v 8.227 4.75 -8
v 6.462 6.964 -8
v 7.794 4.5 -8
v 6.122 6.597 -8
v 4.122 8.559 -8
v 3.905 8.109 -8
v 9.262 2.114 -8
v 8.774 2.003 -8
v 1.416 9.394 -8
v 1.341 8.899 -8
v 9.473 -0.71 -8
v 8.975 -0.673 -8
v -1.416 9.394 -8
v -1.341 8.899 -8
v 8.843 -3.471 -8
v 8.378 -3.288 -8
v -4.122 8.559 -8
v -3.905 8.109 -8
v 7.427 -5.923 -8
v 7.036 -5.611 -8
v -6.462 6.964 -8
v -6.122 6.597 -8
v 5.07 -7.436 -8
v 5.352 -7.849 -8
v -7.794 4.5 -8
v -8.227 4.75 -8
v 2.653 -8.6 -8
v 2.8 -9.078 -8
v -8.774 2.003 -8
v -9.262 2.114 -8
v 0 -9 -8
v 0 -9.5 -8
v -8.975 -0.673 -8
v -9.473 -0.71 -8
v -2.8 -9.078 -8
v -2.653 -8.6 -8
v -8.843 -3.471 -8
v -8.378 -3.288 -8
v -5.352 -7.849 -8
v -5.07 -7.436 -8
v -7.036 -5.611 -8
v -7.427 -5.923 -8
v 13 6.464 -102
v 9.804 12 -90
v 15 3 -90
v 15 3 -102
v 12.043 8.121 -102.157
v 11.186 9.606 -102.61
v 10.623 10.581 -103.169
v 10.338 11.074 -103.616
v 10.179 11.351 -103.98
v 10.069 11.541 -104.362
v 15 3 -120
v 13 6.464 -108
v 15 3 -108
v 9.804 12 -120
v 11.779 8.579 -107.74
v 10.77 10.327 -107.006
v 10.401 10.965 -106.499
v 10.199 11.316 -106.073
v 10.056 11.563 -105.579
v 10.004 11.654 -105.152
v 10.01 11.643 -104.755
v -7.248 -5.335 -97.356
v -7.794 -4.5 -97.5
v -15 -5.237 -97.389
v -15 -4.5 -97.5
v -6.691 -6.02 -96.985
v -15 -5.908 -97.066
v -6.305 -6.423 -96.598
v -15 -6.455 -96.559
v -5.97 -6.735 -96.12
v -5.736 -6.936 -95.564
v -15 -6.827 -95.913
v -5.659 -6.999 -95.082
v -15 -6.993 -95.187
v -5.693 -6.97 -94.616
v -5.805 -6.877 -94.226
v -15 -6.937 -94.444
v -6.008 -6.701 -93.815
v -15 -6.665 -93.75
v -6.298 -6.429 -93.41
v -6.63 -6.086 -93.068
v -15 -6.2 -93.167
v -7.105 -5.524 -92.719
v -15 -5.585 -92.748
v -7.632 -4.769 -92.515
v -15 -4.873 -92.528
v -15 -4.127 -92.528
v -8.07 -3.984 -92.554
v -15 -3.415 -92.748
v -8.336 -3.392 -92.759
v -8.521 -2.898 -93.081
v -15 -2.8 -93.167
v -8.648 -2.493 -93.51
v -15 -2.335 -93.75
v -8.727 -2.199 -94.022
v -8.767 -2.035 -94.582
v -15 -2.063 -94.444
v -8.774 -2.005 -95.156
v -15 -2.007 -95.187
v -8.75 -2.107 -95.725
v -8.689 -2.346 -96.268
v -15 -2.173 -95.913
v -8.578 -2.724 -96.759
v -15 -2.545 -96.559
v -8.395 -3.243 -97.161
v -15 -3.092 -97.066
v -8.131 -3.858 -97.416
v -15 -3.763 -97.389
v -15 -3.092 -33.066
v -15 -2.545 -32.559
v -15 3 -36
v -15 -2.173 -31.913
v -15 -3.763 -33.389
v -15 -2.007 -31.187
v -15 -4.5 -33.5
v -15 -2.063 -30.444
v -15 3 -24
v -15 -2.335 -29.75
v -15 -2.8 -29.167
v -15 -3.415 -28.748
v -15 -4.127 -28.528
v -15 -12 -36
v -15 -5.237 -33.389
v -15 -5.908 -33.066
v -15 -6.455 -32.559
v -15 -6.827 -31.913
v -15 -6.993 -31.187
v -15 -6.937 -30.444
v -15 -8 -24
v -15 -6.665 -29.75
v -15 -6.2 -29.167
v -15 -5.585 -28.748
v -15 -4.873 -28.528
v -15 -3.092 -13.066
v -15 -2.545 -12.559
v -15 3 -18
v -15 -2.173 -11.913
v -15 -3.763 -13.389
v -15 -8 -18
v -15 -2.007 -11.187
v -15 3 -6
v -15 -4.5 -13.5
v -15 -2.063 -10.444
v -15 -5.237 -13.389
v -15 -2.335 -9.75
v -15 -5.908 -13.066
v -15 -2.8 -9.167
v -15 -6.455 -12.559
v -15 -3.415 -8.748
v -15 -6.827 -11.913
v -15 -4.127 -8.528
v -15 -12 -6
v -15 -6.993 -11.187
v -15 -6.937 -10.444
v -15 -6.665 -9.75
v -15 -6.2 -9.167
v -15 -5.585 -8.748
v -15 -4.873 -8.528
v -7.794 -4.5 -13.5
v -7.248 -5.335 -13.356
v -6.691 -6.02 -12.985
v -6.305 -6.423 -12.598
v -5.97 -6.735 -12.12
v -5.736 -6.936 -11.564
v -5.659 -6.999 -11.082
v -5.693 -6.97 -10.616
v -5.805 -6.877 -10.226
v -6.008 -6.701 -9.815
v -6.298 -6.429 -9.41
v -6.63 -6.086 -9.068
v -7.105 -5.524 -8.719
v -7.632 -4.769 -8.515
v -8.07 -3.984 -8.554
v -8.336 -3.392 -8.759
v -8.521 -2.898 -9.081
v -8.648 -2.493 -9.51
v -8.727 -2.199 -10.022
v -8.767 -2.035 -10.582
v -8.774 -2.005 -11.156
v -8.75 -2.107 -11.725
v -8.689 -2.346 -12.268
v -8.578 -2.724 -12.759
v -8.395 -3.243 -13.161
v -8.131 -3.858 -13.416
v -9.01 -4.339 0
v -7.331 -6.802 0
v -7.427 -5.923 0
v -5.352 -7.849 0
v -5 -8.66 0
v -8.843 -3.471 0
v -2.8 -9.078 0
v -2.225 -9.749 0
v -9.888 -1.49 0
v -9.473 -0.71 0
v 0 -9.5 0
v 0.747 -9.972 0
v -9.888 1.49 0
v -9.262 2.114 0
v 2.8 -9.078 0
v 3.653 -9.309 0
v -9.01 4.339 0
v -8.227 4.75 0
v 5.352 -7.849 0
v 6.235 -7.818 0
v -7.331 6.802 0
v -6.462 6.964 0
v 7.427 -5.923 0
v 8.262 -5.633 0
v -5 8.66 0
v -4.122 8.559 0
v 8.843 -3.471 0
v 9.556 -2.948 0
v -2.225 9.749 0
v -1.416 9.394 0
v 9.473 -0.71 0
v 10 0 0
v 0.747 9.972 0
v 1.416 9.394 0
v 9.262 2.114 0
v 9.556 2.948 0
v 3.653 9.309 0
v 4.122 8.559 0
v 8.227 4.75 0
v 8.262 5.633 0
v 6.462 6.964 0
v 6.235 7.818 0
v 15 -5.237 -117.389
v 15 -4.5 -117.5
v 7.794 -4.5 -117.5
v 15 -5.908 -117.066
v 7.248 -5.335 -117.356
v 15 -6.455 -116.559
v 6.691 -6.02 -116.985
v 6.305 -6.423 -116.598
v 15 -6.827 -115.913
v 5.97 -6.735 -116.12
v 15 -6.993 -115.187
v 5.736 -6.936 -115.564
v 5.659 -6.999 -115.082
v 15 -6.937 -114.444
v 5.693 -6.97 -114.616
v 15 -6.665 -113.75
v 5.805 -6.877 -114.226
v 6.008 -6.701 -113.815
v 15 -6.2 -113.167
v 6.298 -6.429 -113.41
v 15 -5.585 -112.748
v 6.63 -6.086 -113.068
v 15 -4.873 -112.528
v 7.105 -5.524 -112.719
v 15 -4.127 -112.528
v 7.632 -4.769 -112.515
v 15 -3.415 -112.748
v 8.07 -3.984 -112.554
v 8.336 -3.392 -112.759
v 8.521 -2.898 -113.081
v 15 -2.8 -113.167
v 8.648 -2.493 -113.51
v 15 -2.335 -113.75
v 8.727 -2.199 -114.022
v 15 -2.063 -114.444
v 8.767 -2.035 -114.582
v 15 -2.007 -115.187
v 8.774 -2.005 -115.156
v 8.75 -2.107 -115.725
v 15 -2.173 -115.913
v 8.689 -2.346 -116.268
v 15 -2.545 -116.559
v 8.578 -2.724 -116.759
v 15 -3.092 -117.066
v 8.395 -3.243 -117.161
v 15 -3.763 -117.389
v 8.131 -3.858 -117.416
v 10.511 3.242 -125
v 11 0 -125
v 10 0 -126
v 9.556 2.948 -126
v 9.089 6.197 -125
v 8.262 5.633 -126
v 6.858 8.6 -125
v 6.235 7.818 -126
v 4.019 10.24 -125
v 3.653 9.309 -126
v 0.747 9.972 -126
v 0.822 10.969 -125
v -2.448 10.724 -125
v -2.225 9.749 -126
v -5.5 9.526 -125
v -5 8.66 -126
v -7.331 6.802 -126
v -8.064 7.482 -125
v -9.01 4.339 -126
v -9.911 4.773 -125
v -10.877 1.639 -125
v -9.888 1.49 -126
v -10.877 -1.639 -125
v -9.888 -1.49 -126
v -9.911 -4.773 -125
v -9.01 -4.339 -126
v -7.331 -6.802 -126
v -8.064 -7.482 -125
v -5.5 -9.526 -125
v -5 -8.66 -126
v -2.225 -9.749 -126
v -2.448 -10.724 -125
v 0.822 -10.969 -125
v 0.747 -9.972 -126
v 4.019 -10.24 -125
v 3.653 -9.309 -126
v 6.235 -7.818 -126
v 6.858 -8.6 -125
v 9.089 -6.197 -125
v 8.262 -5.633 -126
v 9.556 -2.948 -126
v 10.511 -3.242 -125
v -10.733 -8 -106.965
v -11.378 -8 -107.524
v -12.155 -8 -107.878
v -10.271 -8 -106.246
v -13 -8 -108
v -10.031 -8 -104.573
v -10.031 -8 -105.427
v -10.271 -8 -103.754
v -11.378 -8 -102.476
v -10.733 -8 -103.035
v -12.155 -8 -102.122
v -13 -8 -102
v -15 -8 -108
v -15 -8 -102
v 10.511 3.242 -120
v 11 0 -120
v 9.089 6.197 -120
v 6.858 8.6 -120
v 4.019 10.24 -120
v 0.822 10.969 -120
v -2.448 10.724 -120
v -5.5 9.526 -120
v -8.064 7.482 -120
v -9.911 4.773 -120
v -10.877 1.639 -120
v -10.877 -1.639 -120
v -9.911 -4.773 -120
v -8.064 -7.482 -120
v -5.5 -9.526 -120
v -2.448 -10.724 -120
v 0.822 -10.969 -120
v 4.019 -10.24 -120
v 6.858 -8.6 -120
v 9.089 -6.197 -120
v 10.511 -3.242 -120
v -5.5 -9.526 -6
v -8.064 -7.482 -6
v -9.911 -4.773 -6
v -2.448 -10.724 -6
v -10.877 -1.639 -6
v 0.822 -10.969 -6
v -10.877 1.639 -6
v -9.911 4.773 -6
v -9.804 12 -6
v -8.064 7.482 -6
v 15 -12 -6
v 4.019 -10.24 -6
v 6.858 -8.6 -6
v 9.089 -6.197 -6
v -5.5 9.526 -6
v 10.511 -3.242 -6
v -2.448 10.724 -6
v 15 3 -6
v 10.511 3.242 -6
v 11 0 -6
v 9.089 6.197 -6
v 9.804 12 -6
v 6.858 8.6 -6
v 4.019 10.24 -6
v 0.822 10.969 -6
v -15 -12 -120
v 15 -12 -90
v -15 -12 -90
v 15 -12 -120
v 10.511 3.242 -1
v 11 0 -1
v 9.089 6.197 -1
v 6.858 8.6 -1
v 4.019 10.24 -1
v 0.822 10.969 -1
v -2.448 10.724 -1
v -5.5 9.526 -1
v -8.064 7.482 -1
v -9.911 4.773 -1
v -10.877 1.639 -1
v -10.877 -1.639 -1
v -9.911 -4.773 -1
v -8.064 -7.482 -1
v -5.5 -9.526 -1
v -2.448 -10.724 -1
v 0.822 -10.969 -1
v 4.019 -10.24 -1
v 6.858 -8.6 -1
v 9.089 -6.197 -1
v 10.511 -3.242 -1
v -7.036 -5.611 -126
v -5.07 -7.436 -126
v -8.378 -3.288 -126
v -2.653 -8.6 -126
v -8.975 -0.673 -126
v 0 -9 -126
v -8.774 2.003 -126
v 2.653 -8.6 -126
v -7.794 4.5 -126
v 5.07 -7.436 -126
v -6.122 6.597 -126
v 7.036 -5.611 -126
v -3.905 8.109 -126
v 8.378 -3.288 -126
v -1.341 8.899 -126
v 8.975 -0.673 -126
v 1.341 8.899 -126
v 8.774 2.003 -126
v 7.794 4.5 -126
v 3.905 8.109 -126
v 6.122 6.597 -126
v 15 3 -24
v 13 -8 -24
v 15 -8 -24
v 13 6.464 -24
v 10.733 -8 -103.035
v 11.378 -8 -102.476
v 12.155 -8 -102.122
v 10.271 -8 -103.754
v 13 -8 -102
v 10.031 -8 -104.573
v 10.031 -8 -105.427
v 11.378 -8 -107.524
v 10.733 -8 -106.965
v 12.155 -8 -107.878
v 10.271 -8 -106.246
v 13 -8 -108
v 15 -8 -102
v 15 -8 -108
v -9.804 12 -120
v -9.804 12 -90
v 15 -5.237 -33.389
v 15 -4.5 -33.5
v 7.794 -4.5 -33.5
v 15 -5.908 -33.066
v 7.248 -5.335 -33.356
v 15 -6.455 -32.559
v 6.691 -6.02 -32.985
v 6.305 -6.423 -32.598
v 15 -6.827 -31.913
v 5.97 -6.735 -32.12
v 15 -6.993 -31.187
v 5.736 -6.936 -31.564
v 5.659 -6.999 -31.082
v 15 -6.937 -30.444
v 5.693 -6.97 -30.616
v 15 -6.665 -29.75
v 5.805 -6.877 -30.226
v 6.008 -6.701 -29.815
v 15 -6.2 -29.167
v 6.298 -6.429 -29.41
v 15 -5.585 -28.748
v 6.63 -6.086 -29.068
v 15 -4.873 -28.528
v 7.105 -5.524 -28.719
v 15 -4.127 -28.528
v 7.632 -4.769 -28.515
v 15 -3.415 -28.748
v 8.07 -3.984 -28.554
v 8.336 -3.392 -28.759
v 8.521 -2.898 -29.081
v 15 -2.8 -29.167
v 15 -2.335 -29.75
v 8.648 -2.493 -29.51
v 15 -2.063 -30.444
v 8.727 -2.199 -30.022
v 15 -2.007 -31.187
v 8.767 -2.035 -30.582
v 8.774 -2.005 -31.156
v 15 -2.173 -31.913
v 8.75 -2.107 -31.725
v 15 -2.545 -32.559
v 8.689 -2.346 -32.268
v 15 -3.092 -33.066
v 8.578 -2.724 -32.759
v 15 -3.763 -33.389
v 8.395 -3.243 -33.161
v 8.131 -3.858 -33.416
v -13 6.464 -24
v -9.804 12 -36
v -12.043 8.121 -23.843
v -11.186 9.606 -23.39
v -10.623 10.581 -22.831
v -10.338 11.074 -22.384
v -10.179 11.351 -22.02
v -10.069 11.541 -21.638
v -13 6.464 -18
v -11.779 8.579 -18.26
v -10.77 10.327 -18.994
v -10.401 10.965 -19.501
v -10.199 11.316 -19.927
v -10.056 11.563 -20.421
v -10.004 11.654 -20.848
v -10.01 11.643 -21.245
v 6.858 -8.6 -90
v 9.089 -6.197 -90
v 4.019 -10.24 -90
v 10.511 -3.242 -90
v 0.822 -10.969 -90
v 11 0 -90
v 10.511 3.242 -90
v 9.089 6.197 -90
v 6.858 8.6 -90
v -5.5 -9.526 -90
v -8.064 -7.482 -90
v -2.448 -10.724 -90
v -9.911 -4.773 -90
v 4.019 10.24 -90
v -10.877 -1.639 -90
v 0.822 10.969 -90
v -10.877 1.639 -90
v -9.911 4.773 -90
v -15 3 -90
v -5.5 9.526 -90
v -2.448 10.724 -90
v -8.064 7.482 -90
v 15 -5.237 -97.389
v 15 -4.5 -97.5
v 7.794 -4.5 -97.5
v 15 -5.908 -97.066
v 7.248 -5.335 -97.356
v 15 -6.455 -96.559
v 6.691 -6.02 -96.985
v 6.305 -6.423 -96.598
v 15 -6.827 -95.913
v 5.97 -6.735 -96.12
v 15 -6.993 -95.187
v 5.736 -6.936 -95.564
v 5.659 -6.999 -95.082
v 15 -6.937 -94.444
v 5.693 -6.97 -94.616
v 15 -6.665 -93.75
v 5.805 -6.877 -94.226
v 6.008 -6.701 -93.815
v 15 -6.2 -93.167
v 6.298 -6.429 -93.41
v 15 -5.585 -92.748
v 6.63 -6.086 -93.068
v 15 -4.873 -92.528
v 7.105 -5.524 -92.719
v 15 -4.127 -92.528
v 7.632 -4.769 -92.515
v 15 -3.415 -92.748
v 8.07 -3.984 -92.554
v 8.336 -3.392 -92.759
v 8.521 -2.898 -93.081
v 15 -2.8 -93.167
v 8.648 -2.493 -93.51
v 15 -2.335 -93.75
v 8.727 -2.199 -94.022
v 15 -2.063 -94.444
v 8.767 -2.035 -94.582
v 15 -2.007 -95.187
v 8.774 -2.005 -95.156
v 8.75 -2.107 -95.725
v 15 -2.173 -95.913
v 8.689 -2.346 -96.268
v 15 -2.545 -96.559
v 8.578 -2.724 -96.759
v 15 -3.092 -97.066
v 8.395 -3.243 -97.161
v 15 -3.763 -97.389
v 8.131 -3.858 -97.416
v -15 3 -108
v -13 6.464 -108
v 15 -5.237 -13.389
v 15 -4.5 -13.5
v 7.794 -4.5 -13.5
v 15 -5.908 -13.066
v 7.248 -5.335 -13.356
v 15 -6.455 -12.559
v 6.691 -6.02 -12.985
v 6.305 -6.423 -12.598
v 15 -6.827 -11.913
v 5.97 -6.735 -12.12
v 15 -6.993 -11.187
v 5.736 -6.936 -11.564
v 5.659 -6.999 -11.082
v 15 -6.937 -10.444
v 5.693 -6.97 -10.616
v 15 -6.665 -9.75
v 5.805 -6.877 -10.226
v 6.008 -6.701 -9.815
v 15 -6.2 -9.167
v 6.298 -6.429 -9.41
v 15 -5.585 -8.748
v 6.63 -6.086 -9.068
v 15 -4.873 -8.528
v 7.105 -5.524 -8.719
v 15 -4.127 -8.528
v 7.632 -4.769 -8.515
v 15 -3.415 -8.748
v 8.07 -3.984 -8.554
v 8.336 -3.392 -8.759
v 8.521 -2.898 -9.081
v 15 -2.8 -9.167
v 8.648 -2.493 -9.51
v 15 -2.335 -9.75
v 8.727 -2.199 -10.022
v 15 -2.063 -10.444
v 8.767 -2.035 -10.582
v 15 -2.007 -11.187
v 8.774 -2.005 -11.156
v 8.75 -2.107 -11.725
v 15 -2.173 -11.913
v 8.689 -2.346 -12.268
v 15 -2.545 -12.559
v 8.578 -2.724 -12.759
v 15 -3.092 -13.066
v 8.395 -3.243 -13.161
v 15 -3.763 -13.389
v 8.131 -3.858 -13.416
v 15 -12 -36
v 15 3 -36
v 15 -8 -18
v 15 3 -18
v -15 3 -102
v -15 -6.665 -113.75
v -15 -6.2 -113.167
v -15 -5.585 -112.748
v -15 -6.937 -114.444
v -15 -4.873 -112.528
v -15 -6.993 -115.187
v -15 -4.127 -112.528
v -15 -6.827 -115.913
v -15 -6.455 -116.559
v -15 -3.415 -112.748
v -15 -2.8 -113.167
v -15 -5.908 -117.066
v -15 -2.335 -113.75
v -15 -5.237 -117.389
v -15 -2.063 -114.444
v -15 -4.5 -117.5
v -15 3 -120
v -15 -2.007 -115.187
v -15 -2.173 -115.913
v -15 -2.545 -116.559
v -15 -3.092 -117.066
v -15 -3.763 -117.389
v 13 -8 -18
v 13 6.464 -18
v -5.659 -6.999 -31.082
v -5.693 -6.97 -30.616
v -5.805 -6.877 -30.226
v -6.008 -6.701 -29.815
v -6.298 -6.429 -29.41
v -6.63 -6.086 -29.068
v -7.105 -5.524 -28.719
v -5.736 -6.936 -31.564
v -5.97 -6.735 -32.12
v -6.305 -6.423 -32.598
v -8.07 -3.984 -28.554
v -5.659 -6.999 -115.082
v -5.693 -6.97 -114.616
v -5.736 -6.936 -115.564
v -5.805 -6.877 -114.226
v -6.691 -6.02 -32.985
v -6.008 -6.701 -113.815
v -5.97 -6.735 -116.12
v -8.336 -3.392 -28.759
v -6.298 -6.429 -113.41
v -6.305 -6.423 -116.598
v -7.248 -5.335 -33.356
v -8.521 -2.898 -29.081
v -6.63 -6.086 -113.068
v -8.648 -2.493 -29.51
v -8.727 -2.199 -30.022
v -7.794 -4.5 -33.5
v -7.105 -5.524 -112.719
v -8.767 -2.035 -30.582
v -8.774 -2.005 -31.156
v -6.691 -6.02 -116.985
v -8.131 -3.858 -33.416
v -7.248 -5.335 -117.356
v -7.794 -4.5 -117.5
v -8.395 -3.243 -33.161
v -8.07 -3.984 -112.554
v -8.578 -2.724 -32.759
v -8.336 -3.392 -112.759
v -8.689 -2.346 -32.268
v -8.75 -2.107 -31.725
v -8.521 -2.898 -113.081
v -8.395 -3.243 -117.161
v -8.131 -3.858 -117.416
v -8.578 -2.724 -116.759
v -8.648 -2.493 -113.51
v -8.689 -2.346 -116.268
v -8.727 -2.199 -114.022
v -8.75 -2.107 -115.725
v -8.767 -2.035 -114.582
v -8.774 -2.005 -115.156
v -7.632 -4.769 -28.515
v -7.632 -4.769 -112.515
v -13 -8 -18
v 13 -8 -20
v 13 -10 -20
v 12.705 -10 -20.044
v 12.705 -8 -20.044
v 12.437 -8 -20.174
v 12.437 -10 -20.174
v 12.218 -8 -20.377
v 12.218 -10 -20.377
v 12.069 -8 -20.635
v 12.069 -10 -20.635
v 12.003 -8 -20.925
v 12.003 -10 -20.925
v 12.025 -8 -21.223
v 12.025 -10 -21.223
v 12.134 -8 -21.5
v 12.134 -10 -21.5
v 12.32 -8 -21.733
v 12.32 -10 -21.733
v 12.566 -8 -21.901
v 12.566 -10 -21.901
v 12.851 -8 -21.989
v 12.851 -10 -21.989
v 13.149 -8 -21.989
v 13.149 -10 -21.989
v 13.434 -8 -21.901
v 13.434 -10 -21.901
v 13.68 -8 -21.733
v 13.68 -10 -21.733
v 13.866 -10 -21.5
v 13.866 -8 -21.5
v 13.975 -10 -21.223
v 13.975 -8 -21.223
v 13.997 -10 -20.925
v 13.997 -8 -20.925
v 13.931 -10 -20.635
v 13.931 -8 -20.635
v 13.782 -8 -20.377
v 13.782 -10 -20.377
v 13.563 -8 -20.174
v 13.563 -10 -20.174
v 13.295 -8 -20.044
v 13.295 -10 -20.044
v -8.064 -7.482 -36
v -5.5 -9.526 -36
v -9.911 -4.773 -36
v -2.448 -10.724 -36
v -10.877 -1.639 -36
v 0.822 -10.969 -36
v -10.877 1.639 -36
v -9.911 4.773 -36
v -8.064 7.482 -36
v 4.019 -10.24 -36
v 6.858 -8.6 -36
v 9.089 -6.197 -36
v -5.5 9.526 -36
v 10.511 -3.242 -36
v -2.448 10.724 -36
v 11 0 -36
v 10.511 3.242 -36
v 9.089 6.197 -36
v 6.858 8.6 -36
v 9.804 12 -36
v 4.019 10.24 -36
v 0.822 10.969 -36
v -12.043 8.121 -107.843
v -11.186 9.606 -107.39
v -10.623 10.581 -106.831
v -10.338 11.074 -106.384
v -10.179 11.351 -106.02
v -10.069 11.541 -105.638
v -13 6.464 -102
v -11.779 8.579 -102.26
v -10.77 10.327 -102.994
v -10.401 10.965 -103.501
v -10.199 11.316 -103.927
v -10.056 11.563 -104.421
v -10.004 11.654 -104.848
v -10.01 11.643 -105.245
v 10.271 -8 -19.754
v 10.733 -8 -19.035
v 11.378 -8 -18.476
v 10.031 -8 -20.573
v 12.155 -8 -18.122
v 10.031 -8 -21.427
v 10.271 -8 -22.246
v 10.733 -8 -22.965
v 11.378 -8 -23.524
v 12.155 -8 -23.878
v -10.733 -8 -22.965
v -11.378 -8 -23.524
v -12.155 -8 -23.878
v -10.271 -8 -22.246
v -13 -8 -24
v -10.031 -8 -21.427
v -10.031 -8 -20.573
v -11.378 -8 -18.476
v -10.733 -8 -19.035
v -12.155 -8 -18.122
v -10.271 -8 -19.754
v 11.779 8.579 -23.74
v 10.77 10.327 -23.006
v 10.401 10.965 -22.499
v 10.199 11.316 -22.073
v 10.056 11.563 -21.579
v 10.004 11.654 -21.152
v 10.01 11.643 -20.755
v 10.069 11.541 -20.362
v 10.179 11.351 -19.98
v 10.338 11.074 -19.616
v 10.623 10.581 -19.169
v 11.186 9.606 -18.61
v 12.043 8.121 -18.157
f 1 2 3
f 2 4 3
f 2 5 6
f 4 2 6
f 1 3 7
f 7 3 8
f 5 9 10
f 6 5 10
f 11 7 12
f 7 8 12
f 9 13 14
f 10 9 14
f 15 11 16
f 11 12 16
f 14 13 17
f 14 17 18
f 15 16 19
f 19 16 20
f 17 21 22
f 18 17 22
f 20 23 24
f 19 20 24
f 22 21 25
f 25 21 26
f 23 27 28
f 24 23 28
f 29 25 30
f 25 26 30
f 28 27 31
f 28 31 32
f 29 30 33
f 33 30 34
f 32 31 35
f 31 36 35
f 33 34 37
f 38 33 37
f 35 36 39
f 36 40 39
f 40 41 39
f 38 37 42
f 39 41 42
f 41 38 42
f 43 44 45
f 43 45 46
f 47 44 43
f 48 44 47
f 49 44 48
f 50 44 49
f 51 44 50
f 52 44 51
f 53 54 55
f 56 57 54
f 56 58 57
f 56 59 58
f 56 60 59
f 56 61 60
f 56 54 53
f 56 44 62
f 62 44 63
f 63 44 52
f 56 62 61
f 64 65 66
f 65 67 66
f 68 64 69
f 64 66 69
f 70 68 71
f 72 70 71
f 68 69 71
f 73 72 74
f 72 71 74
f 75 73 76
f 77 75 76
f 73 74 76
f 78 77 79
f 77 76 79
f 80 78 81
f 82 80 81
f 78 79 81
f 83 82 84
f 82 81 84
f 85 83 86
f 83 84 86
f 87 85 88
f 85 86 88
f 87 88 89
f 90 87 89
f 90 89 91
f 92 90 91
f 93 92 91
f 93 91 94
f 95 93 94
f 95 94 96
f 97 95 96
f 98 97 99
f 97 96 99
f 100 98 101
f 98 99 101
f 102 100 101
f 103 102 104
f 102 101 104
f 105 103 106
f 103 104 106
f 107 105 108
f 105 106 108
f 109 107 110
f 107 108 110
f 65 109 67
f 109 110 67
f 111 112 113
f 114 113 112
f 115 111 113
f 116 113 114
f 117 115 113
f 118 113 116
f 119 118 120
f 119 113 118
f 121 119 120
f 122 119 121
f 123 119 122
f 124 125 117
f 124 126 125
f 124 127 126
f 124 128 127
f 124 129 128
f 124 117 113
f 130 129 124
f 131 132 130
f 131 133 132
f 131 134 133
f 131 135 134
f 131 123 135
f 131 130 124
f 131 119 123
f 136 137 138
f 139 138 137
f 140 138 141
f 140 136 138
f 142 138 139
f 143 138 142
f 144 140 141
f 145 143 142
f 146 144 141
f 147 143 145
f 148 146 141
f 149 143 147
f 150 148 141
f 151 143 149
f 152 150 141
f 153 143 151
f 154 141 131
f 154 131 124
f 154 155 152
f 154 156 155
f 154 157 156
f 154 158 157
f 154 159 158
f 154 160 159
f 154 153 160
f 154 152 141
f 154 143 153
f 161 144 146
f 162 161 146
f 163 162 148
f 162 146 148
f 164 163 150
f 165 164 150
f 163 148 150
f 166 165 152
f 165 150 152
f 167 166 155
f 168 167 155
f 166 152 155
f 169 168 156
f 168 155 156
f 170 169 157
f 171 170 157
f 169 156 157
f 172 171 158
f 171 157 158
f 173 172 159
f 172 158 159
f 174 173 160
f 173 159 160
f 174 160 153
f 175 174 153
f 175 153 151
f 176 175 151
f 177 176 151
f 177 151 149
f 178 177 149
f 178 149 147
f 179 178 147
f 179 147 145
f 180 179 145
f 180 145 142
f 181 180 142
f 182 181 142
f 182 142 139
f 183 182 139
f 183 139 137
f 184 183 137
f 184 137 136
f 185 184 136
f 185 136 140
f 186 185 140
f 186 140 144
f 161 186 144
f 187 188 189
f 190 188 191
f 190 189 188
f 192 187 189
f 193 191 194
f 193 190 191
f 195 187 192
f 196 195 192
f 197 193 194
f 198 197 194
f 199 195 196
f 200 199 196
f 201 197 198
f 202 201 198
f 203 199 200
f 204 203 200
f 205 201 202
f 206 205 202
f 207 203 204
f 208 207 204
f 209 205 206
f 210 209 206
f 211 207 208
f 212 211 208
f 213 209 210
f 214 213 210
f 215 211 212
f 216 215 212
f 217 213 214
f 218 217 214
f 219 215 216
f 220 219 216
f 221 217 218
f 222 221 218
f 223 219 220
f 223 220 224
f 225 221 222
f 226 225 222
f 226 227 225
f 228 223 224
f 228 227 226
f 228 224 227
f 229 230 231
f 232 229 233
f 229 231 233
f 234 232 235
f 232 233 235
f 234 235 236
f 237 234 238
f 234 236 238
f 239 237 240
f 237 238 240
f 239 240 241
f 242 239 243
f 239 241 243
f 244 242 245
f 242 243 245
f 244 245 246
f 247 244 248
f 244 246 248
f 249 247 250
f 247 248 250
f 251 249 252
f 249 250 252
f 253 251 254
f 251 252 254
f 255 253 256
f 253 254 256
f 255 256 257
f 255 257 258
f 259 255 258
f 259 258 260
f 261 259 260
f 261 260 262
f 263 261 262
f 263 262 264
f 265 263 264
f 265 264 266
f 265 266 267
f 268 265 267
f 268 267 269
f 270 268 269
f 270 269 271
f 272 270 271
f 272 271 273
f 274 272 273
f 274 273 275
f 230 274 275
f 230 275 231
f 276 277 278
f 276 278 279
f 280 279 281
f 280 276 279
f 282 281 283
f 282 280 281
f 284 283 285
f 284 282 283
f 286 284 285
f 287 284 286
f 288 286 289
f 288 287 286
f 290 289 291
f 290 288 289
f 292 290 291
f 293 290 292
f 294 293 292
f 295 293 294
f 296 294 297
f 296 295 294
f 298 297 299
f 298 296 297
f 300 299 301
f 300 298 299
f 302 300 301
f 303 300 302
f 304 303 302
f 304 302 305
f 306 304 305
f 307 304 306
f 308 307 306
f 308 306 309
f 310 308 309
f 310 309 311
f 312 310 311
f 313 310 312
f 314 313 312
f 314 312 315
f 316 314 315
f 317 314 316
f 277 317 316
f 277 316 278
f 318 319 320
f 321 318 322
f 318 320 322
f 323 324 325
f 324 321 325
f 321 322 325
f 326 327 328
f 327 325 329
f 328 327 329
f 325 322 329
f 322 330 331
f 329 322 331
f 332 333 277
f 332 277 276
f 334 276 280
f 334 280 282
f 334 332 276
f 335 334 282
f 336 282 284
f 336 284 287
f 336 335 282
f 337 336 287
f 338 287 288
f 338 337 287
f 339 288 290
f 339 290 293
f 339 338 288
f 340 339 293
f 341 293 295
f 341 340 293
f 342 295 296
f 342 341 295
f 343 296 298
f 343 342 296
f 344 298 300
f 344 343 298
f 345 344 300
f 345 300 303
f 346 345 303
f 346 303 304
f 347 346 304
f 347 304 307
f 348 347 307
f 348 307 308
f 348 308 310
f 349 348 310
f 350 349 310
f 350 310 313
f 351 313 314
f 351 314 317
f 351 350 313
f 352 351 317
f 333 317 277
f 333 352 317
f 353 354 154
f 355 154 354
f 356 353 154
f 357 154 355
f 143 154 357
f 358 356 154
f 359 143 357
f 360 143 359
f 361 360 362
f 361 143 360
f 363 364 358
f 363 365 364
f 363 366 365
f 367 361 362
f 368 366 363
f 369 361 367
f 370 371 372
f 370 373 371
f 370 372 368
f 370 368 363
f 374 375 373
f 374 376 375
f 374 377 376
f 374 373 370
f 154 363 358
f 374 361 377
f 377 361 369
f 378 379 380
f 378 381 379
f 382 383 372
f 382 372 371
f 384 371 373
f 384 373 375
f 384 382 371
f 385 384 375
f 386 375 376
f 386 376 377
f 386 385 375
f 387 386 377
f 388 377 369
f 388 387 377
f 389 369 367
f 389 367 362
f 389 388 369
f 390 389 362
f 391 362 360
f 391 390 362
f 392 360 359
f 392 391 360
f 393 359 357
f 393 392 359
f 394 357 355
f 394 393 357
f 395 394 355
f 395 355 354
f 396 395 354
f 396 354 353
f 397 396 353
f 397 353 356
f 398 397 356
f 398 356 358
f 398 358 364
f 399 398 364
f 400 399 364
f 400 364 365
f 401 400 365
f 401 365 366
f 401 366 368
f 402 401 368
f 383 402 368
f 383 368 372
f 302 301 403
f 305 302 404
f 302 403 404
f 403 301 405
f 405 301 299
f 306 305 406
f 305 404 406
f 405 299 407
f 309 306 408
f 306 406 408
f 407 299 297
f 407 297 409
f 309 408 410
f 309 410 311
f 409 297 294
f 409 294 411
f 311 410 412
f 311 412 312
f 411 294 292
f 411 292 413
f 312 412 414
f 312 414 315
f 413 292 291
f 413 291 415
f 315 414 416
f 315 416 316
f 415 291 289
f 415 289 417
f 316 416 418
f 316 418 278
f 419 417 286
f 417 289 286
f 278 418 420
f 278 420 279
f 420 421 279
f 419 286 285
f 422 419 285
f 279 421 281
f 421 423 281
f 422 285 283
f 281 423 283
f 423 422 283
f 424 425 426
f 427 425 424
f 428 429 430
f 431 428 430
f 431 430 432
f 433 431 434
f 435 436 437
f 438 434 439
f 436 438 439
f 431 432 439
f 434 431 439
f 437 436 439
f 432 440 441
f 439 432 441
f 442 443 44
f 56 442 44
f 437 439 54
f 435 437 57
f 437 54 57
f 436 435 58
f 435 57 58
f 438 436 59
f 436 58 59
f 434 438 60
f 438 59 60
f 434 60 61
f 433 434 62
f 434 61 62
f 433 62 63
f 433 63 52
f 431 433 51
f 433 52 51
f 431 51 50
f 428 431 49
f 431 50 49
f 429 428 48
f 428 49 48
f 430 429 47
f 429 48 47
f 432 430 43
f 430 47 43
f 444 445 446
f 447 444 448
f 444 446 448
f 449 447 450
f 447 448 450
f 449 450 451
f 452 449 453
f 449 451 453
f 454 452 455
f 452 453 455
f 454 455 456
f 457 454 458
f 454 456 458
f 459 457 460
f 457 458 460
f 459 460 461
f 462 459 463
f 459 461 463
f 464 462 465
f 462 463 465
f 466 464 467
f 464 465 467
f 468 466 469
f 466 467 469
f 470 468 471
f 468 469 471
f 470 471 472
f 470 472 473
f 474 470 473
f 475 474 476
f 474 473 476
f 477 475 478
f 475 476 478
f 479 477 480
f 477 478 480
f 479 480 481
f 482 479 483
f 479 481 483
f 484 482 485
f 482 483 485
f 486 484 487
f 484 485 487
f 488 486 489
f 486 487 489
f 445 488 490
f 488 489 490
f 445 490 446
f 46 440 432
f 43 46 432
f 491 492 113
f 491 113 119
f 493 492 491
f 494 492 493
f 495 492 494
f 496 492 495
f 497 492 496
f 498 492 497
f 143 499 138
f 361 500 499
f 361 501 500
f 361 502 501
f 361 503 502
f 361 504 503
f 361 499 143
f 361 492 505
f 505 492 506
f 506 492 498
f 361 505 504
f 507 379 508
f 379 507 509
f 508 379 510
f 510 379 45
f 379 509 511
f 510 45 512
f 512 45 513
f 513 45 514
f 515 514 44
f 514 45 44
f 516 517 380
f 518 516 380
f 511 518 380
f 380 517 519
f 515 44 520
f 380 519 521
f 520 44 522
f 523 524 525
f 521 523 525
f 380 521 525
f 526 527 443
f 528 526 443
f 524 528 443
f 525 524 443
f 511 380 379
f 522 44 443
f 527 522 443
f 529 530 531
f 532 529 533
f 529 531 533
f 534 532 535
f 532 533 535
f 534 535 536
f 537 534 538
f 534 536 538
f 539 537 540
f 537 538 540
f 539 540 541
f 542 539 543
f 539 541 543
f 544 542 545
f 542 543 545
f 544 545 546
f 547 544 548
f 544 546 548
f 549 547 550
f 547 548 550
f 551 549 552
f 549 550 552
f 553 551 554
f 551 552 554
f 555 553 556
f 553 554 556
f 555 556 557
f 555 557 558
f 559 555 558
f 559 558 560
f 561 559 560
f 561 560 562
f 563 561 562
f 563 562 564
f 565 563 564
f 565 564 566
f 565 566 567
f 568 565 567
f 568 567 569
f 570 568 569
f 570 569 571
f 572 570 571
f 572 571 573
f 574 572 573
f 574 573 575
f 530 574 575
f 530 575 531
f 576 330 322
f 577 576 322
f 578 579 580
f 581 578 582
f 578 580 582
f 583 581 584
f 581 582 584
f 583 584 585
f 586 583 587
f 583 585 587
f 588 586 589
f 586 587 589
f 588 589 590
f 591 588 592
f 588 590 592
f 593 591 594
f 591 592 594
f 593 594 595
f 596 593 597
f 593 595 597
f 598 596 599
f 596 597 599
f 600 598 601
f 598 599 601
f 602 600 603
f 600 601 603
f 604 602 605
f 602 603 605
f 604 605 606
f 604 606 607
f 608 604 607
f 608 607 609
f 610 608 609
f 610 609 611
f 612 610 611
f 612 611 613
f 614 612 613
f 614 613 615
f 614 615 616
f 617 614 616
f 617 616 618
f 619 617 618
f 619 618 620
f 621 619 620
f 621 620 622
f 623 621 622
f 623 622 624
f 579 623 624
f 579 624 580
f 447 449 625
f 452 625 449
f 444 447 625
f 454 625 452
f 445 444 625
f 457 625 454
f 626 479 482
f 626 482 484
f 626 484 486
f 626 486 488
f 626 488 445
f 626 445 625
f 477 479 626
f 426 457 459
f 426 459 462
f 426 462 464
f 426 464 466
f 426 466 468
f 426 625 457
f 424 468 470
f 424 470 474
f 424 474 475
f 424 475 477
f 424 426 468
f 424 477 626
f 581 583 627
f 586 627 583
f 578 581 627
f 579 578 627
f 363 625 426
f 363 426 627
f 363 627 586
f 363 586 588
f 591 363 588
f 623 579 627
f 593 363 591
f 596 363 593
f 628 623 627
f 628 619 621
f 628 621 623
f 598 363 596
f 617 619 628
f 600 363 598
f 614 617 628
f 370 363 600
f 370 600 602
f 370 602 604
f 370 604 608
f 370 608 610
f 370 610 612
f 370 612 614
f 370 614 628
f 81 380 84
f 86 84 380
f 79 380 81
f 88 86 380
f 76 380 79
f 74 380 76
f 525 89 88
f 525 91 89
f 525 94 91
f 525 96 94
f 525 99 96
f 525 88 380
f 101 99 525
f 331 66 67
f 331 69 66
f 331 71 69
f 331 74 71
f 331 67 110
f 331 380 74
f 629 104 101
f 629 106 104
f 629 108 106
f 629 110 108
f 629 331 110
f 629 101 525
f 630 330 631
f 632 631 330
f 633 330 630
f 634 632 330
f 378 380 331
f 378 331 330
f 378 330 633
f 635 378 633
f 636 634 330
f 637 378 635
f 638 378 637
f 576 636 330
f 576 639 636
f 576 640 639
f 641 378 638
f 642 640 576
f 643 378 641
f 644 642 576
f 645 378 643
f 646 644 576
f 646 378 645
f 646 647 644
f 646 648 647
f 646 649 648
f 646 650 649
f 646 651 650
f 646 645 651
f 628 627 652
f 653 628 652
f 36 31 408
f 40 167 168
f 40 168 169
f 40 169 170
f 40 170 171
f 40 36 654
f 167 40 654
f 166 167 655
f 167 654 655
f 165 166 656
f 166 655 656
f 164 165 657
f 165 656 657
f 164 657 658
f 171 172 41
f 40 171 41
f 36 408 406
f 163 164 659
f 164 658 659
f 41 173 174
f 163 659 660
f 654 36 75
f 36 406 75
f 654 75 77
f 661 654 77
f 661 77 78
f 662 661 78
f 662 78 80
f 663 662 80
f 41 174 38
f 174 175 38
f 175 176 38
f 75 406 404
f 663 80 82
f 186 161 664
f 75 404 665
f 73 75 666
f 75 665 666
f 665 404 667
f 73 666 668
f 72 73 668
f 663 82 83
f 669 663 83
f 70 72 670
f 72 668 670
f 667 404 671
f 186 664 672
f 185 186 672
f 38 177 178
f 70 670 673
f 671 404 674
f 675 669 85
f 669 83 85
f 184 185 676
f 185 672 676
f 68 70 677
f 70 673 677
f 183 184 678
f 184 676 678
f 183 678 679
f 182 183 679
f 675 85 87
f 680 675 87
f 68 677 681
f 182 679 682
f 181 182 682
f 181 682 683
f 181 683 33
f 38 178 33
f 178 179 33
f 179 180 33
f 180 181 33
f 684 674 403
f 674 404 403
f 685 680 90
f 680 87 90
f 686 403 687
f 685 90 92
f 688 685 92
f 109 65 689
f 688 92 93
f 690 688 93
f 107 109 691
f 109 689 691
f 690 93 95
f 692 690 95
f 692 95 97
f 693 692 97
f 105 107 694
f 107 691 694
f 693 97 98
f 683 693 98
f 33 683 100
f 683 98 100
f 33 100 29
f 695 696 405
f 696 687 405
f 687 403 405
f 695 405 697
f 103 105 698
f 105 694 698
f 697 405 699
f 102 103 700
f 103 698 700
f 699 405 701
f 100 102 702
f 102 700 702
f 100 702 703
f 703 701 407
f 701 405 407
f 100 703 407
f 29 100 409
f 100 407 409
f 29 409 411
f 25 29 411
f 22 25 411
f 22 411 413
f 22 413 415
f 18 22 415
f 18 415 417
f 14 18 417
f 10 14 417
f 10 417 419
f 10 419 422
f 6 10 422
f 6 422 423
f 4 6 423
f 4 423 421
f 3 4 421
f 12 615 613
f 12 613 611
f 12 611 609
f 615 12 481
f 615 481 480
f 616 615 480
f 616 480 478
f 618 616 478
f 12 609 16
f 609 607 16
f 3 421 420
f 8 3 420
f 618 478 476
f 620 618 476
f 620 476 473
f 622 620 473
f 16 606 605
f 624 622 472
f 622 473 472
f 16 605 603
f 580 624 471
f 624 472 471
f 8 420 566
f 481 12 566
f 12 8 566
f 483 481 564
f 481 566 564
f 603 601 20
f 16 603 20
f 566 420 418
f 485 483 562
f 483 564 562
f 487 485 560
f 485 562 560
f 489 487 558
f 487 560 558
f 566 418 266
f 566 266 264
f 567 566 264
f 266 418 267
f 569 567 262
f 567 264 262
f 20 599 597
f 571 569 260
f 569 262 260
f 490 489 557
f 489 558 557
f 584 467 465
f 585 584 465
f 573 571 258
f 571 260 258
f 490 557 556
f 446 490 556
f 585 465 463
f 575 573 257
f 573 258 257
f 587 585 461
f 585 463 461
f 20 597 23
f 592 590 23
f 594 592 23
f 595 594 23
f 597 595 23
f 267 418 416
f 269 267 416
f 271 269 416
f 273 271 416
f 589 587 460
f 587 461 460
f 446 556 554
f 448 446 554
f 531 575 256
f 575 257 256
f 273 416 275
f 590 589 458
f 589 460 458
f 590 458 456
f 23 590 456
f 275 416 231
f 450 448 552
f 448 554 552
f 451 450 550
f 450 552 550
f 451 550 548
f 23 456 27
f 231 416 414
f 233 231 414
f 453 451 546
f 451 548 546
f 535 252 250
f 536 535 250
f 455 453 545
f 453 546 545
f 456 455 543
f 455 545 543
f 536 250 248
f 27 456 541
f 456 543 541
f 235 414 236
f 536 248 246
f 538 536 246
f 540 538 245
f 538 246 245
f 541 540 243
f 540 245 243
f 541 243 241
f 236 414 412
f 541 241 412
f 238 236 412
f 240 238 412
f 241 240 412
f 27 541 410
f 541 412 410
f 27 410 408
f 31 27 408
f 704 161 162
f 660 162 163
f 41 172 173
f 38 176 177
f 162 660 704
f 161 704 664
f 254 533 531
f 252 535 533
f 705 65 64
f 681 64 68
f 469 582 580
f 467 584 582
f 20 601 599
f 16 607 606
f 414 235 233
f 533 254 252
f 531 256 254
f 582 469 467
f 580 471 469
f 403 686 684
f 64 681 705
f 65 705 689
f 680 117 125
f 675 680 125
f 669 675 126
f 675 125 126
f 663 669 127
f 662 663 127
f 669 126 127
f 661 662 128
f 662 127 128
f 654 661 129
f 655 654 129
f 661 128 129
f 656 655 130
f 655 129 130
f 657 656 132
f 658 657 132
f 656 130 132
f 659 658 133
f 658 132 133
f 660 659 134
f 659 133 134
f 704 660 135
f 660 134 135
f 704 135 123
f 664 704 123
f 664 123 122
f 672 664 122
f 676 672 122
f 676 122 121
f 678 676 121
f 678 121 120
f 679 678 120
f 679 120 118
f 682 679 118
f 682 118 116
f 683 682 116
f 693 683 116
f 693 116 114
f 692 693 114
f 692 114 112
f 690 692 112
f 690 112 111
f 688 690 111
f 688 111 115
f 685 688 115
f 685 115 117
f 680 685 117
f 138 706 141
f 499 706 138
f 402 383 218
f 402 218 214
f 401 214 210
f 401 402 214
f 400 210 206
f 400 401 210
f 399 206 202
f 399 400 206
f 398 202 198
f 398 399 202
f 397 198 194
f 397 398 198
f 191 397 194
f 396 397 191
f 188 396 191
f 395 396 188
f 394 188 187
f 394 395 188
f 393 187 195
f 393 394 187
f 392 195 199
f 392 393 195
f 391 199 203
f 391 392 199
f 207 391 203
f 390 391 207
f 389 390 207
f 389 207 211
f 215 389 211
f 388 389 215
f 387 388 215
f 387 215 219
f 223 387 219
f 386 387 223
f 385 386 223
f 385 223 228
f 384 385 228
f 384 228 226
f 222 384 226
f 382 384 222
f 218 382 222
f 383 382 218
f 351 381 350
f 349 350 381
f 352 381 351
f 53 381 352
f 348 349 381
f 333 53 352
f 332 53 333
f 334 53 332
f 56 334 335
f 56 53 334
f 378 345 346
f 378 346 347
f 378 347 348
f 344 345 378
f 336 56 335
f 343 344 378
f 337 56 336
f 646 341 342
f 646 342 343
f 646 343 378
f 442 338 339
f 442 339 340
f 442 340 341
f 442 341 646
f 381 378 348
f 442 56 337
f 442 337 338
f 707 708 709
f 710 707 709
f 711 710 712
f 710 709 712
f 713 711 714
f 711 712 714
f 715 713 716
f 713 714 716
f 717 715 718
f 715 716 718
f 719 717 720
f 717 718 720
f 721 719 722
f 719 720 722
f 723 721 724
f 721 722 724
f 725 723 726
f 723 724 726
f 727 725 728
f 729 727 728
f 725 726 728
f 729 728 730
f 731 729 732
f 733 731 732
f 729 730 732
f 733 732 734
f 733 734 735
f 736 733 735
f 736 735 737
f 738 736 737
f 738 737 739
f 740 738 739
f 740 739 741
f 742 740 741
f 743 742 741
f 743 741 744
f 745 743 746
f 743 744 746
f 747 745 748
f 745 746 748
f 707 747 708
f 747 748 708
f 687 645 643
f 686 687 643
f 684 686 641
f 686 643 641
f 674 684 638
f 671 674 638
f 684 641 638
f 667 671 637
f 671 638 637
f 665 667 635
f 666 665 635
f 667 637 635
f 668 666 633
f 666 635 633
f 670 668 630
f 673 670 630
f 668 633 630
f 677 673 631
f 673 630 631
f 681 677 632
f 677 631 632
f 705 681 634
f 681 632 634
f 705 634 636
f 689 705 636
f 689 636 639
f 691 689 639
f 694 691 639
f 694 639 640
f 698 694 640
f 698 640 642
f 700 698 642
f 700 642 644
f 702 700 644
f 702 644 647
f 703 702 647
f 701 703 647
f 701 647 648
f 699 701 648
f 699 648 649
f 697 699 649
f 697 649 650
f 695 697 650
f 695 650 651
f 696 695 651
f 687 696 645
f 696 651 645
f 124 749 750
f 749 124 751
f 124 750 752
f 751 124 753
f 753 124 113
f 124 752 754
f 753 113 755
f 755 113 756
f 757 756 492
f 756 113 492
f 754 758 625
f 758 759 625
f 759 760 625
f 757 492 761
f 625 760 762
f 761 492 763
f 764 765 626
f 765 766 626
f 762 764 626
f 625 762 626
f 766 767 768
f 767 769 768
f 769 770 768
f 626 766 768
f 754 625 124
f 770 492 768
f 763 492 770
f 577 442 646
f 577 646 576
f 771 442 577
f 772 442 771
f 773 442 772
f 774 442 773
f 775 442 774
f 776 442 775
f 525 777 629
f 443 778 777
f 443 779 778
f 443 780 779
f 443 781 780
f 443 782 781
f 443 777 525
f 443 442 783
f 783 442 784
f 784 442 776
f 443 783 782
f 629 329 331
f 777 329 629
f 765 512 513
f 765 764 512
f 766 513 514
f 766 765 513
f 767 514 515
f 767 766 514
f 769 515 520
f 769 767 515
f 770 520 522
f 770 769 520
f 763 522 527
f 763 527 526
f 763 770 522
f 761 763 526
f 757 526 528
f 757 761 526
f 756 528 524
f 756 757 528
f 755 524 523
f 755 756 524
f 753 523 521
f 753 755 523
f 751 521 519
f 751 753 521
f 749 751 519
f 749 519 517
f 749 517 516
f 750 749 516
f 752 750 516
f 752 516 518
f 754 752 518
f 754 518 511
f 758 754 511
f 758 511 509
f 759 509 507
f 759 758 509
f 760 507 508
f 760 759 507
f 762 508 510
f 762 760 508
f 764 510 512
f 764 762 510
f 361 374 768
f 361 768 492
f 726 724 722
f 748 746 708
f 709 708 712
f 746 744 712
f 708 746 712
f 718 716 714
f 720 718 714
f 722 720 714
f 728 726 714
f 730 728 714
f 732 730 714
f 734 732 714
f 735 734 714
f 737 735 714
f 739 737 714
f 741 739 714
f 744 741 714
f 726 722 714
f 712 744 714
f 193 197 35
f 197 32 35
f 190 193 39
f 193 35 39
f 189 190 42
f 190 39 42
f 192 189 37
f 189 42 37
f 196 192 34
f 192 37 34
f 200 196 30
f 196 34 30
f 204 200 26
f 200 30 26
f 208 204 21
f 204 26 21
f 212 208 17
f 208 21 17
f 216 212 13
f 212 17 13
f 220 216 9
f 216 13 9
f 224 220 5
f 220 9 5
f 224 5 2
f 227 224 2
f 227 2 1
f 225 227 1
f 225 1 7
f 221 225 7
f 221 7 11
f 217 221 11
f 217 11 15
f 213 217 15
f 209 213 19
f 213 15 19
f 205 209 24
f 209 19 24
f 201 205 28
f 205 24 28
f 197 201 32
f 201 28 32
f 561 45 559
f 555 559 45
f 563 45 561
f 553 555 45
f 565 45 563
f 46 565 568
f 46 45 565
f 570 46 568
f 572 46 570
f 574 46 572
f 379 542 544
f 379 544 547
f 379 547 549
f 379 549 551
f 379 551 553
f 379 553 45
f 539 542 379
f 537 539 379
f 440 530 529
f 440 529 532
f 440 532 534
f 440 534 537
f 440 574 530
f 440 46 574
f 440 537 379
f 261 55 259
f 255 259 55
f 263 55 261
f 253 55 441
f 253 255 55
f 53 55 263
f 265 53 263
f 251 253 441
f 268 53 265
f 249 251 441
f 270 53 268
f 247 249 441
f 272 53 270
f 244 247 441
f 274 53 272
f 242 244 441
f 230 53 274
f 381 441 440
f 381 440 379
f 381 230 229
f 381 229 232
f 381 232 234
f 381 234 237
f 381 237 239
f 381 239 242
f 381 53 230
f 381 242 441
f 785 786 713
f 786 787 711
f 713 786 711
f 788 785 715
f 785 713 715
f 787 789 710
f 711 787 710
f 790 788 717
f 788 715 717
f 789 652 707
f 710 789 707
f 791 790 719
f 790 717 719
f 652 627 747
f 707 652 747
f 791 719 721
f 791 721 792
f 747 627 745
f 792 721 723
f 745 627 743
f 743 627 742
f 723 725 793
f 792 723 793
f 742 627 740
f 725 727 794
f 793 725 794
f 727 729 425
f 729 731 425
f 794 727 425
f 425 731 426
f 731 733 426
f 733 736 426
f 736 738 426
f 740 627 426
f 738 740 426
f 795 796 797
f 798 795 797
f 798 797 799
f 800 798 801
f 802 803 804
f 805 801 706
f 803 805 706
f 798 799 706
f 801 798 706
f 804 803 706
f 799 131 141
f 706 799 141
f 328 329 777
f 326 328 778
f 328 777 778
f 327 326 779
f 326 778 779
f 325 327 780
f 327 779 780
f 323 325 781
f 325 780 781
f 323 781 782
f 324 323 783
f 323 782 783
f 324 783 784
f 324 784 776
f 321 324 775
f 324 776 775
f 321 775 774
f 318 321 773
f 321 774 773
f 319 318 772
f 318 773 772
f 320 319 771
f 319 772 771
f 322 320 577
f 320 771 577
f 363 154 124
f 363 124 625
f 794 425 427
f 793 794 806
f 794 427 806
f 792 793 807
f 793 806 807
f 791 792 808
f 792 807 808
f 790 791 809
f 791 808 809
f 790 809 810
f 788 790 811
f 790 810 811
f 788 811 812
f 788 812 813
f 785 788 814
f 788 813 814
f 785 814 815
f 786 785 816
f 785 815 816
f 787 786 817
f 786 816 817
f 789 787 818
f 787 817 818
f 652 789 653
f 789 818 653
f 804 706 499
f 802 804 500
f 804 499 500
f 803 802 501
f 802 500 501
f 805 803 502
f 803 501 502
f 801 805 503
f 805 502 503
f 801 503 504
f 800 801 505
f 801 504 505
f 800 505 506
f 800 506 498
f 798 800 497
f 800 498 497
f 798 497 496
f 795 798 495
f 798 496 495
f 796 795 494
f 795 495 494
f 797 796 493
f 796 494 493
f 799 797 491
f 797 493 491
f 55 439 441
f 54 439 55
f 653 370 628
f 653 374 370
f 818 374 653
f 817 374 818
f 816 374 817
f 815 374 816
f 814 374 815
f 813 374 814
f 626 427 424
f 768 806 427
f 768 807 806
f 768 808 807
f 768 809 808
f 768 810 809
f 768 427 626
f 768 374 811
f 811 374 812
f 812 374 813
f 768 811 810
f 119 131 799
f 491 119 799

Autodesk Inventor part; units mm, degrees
sketch "Skizze1" plane through (0, 0, 0) normal (0, 0, 1) x (1, 0, 0)
  circle A0 centre (0, 0) radius 11
  dimension "d0" = 22
extrude "Extrusion1" add sketch "Skizze1" against normal blind 126
ref_plane "Arbeitsebene1" through (0, 0, -6) normal (0, 0, 1) x (1, 0, 0)
sketch "Skizze2" plane through (0, 0, -6) normal (0, 0, 1) x (1, 0, 0)
  line L0 (-15, -12) -> (15, -12)
  line L1 (15, -12) -> (15, 12)
  line L2 (15, 12) -> (-15, 12)
  line L3 (-15, 12) -> (-15, -12)
  line L4 (-15, -12) -> (15, 12) construction
  line L5 (15, -12) -> (-15, 12) construction
  point P0 (0, 0)
  dimension "d4" = 24
  dimension "d5" = 30
extrude "Extrusion2" add sketch "Skizze2" against normal blind 30
chamfer "Fasen1" distance 9 angle 30 1 edges at (15, 12, -21) measured on face at (15, -4, -16)
chamfer "Fasen2" distance 9 angle 30 1 edges at (-15, 12, -21) measured on face at (-15, 4, -16)
ref_plane "Arbeitsebene2" through (0, 0, -63) normal (0, 0, 1) x (1, 0, 0)
mirror "Spiegeln1" about plane through (0, 0, -63) normal (0, 0, 1) of "Extrusion2", "Fasen2", "Fasen1"
ref_plane "Arbeitsebene4" through (9.8038, 12, -120) normal (0, -1, 0) x (0, 0, -1)
sketch "Skizze4" plane through (9.8038, 12, -120) normal (0, -1, 0) x (0, 0, -1)
  line L0 (-30, 5.1962) -> (-30, 0) projected
  line L1 (0, 5.1962) -> (-30, 5.1962) projected
  line L2 (0, 0) -> (0, 5.1962) projected
  line L3 (-30, 0) -> (0, 0) projected
  line L4 (-18, 5.1962) -> (-18, 3.1962)
  arc A0 (-18, 3.1962) -> (-12, 3.1962) centre (-15, 3.1962) ccw
  line L5 (-12, 3.1962) -> (-12, 5.1962)
  point P0 (-120, -9.8038)
  point P1 (-15, 5.1962)
  dimension "d18" = 2
  dimension "d19" = 6
extrude "Extrusion3" cut sketch "Skizze4" along normal blind 20 contours L1 L5 A0 L4
mirror "Spiegeln2" about plane through (0, 0, -63) normal (0, 0, 1) of "Extrusion3"
ref_plane "Arbeitsebene5" through (0, 0, 0) normal (1, 0, 0) x (0, 1, 0)
mirror "Spiegeln3" about plane through (0, 0, 0) normal (1, 0, 0) of "Extrusion3", "Spiegeln2"
sketch "Skizze5" plane through (13, -8, -18) normal (0, 1, 0) x (1, 0, 0)
  arc A0 (0, 6) -> (0, 0) centre (0, 3) ccw projected
  point P0 (-13, -18)
hole "Bohrung1" at (13, -8, -21) direction (0, -1, 0) diameter 2 depth 2
sketch "Skizze6" plane through (15, -12, -6) normal (1, 0, 0) x (0, 0, -1)
  line L0 (0, 0) -> (0, 15) projected
  line L1 (0, 0) -> (30, 0) projected
  line L2 (15, 0) -> (15, 23.6603) construction
  ellipse E0 centre (15, 18.4641) end of major axis (15, 23.6603) minor radius 3 (18, 18.4641) -> (12, 18.4641) ccw projected
  line L3 (114, 0) -> (84, 0) projected
  line L4 (99, 0) -> (99, 23.6603) construction
  ellipse E1 centre (99, 18.4641) end of major axis (99, 23.6603) minor radius 3 (102, 18.4641) -> (96, 18.4641) ccw projected
  line L5 (84, 15) -> (84, 0) projected
  point P0 (-6, 12)
  point P1 (5, 7.5)
  point P2 (0, 7.5)
  point P3 (25, 7.5)
  point P4 (89, 7.5)
  point P5 (109, 7.5)
  point P6 (84, 7.5)
  point P7 (84, 7.5)
  dimension "d30" = 5
  dimension "d31" = 5
hole "Bohrung2" at (15, -4.5, -11) at (15, -4.5, -31) at (15, -4.5, -95) at (15, -4.5, -115) direction (-1, 0, 0) diameter 5 depth 30
sketch "Skizze7" plane through (0, 0, 0) normal (0, 0, 1) x (1, 0, 0)
  circle A0 centre (0, 0) radius 11 projected
hole "Bohrung3" at (0, 0, 0) direction (0, 0, -1) diameter 19 depth 8
sketch "Skizze8" plane through (0, 0, -8) normal (0, 0, 1) x (1, 0, 0)
  circle A0 centre (0, 0) radius 11 projected
hole "Bohrung4" at (0, 0, -8) direction (0, 0, -1) diameter 18 depth 118
chamfer "Fasen3" distance 1 angle 45 1 edges at (-11, 0, 0)
chamfer "Fasen4" distance 1 angle 45 1 edges at (-11, 0, -126)
properties part number "Wellengehäuse" material "Stahl, galvanisiert"
